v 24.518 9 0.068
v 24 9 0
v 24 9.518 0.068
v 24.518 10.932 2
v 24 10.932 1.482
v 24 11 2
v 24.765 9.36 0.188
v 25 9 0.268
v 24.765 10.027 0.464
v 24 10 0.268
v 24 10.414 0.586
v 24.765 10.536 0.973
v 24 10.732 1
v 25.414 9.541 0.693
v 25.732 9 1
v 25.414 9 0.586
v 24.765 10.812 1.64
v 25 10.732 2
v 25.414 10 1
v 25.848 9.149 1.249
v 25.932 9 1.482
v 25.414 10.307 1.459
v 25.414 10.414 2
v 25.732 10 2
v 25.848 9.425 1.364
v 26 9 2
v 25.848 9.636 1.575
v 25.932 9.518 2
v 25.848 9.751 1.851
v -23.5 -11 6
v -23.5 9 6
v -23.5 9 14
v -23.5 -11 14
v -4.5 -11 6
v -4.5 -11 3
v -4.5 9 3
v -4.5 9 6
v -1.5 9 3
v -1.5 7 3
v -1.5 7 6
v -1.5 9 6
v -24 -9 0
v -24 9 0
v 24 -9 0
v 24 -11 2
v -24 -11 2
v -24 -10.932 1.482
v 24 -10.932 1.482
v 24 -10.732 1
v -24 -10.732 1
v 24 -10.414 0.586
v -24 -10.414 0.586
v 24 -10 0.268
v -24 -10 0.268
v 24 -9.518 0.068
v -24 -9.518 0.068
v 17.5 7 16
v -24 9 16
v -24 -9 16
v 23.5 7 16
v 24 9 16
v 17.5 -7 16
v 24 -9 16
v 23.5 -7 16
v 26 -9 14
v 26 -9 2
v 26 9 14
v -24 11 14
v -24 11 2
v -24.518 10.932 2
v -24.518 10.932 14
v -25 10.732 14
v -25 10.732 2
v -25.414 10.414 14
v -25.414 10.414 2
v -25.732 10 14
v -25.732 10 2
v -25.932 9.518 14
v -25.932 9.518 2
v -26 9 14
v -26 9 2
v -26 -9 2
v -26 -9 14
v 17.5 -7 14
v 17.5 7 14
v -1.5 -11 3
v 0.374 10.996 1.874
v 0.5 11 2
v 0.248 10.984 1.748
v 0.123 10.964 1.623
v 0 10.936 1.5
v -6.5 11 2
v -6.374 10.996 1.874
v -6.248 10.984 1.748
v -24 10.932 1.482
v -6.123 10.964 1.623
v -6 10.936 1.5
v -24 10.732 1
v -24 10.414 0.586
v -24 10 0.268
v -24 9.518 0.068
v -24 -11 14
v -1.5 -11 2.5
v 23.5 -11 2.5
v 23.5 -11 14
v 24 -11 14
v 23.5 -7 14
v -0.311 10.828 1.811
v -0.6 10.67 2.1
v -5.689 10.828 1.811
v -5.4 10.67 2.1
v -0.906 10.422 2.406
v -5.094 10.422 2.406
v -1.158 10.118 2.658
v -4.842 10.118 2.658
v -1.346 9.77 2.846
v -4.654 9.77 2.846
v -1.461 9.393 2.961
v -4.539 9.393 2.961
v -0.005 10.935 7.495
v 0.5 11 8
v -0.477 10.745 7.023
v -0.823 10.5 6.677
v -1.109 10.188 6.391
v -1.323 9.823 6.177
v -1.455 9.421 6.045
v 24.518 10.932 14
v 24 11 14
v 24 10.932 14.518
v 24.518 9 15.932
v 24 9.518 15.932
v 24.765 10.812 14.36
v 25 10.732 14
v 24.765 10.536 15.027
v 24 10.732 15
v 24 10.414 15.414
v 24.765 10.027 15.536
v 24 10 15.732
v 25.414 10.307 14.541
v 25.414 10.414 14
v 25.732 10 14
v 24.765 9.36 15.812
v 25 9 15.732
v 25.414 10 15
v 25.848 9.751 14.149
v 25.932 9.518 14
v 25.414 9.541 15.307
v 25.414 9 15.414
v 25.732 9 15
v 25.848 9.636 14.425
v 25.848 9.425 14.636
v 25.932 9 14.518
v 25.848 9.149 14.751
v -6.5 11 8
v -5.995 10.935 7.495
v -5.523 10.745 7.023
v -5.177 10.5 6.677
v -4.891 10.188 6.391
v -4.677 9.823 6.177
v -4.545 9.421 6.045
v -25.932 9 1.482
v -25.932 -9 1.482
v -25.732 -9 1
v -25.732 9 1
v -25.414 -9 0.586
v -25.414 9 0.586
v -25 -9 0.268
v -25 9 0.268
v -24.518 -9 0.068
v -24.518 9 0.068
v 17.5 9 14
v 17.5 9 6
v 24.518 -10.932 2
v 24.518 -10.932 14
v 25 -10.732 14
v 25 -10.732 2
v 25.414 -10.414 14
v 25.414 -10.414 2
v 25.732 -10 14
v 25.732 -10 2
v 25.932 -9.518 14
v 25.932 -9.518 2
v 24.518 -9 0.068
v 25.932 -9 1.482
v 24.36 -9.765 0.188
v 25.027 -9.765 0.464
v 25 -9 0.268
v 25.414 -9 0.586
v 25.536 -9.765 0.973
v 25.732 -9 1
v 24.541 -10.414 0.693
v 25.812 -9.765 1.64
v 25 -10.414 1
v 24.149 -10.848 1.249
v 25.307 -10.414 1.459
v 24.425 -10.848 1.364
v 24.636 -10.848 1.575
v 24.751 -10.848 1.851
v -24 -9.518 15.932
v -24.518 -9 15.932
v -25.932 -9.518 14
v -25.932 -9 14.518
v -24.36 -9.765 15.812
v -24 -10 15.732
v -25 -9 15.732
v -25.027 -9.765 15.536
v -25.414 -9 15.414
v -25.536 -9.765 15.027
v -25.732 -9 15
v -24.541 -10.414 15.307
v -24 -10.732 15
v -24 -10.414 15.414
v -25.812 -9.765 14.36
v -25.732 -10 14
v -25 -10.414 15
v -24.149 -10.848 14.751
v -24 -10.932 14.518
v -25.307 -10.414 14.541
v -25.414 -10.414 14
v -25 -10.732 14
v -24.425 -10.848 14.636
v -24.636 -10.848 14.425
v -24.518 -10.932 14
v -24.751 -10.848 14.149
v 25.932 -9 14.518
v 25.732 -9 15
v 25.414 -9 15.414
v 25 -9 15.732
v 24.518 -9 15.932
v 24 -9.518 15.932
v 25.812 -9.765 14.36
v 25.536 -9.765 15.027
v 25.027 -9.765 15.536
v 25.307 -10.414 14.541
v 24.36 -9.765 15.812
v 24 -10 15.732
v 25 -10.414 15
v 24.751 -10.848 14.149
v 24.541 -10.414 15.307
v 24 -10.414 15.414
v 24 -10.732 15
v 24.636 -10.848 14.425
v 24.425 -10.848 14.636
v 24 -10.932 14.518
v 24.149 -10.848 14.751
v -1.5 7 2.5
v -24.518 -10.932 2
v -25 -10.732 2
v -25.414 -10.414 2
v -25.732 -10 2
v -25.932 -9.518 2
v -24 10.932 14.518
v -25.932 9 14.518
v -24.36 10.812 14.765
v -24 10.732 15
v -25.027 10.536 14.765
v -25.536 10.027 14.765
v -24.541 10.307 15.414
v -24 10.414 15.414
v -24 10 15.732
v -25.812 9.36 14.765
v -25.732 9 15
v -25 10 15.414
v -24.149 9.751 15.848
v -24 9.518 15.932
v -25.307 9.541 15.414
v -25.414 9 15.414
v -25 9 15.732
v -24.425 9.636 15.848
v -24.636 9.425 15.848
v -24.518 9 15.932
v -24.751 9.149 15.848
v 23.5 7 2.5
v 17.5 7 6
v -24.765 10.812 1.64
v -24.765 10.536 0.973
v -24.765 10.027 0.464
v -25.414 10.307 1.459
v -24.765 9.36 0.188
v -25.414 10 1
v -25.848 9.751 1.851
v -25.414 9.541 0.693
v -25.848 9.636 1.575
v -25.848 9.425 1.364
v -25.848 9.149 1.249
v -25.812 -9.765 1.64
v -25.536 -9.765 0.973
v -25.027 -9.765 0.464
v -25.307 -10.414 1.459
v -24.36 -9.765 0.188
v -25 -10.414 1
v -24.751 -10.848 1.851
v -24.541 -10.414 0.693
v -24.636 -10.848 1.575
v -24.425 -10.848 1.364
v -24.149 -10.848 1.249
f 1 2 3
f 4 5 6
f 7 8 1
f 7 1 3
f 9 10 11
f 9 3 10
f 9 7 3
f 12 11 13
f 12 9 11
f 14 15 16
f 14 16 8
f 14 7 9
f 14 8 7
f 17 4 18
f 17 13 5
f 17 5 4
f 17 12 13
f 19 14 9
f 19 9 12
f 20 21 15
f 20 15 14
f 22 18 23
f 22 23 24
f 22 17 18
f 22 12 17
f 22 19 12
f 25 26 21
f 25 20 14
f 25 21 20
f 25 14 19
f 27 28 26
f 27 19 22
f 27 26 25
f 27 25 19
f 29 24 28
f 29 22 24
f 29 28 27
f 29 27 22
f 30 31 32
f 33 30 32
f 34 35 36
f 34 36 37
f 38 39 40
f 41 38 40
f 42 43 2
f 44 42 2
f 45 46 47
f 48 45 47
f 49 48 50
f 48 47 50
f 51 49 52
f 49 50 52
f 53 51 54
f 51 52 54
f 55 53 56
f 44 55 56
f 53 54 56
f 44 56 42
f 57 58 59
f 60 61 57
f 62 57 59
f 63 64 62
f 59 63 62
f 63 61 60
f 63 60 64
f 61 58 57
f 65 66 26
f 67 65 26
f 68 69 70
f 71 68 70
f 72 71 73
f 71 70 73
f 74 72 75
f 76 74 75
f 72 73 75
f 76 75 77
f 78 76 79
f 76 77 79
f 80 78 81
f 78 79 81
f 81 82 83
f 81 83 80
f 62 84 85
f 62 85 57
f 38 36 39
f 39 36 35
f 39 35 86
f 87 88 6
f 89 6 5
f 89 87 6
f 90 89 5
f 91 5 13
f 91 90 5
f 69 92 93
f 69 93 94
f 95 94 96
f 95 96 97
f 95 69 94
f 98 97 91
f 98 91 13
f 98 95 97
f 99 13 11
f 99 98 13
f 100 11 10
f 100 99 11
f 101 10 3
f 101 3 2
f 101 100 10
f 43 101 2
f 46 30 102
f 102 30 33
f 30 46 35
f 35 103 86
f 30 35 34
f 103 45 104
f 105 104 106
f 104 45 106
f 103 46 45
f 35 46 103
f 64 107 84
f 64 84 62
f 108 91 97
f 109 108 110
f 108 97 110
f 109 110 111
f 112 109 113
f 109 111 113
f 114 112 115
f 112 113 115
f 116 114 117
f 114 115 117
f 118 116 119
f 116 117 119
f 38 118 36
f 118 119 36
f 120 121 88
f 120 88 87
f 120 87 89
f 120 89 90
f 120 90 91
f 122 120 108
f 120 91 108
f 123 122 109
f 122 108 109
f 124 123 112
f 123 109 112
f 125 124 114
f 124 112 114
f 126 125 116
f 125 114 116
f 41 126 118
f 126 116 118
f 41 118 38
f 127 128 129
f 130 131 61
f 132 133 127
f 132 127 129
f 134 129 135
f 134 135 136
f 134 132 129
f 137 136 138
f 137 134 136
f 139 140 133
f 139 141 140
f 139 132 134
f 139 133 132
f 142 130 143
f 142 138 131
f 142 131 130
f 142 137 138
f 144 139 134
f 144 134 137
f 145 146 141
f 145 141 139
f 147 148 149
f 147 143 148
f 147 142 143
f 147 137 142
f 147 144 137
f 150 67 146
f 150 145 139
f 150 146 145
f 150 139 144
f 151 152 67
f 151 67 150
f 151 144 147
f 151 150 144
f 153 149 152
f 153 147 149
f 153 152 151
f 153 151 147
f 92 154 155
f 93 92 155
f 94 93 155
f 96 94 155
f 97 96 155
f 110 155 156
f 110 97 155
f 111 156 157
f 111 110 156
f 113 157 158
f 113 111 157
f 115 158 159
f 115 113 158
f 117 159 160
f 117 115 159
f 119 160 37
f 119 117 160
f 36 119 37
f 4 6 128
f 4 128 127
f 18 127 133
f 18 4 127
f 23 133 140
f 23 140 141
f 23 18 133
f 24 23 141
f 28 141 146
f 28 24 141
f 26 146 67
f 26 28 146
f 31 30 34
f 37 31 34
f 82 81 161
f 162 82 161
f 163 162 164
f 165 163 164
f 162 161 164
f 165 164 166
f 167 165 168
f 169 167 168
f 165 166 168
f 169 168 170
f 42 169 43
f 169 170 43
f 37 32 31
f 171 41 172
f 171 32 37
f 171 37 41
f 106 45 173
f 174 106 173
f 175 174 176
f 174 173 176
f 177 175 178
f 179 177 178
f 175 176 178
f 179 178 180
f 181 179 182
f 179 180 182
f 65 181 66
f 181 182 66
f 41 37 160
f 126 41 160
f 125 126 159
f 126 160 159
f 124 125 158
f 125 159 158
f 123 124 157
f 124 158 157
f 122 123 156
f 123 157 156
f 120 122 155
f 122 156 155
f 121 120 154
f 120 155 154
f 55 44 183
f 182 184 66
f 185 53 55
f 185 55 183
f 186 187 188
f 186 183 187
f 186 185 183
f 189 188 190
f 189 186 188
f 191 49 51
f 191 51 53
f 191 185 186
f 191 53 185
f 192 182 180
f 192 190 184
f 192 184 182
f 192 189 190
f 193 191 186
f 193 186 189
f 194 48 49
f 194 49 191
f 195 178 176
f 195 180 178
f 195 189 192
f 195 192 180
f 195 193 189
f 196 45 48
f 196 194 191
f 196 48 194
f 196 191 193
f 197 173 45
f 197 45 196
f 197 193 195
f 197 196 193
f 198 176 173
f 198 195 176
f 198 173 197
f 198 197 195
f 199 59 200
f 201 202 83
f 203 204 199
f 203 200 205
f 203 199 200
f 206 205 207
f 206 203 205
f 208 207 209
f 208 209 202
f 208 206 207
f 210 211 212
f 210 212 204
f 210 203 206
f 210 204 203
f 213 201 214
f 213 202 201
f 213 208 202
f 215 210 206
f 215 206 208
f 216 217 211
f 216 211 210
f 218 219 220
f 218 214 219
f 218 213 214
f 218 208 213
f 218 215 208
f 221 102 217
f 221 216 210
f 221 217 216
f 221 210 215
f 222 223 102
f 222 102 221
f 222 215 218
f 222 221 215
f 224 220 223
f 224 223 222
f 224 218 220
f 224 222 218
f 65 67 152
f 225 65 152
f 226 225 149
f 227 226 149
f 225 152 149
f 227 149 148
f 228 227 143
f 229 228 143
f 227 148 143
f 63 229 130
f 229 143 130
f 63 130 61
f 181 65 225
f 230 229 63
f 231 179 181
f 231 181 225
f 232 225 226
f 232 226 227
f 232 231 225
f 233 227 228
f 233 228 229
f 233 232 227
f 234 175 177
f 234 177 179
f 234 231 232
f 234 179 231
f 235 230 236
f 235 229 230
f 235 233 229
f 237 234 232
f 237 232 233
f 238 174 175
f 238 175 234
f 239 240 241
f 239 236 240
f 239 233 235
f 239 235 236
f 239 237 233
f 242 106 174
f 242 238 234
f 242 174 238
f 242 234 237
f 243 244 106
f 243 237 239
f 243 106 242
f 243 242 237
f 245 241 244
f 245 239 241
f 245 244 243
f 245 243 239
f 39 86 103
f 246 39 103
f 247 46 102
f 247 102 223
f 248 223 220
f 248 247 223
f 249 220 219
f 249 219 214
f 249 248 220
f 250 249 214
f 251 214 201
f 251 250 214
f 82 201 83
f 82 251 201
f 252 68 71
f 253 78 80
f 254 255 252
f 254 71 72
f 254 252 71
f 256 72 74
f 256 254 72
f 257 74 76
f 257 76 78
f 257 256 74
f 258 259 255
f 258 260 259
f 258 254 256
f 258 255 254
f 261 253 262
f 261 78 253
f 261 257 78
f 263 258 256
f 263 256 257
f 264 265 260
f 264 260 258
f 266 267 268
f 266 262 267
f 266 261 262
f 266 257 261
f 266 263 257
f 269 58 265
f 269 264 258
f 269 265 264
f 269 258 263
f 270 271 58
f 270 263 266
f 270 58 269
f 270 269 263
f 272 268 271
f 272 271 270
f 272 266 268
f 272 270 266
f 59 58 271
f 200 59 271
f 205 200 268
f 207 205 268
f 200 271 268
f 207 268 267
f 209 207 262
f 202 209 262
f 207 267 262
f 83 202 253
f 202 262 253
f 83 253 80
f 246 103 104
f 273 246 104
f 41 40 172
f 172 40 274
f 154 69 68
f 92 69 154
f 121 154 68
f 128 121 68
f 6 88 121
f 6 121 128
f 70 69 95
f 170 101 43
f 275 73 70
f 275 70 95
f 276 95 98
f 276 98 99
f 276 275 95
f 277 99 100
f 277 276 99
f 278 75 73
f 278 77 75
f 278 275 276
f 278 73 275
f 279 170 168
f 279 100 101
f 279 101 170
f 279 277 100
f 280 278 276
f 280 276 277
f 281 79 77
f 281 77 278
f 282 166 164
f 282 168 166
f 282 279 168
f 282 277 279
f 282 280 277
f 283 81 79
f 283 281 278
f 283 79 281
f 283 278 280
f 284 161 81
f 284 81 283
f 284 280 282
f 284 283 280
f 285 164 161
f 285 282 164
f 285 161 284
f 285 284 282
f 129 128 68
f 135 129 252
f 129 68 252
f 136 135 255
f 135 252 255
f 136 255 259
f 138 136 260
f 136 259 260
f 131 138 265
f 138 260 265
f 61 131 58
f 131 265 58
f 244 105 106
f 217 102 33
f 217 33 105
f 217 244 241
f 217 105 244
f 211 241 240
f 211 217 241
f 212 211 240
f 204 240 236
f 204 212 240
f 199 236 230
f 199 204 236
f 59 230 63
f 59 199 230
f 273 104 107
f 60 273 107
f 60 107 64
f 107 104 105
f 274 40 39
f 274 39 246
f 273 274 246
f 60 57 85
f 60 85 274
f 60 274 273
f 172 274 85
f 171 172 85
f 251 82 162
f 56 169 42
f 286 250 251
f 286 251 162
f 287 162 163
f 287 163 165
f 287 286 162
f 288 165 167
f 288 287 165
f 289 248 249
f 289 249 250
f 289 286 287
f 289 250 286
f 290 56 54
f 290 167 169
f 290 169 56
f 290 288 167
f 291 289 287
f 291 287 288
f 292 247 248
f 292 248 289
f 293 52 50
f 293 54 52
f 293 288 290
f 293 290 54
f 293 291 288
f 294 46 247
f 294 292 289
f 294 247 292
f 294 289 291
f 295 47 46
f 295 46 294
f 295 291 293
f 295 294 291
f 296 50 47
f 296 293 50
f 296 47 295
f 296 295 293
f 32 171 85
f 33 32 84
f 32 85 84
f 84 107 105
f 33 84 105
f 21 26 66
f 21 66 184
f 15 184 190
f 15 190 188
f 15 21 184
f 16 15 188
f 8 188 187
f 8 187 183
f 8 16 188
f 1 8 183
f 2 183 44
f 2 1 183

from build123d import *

# Parameters (mm, degrees)
F0_W           = 52
F0_H           = 22
F1_DEPTH       = 16
F2_W           = 41
F2_H           = 8
F3_DEPTH       = 20
F4_W           = 6
F4_H           = 10
F5_DEPTH       = 18
F6_W           = 3
F6_H           = 3
F7_DEPTH       = 22
F8_W           = 4
F8_H           = 2
F9_DEPTH       = 6
F10_T1_DEPTH   = 18
F10_T3_DEPTH   = 12
F10_T5_DEPTH   = 48
F10_T7_DEPTH   = 3
F10_T9_DEPTH   = 3
F10_S13_W      = 2
F10_S13_H      = 2
F10_T14_DEPTH  = 2
F10_S19_W      = 2
F10_S19_H      = 2
F10_T20_DEPTH  = 2
F10_S25_W      = 2
F10_S25_H      = 2
F10_T26_DEPTH  = 2
F10_S31_W      = 2
F10_S31_H      = 2
F10_T32_DEPTH  = 2
F10_S37_W      = 2
F10_S37_H      = 2
F10_T38_DEPTH  = 2
F10_S43_W      = 2
F10_S43_H      = 2
F10_T44_DEPTH  = 2
F10_S49_W      = 2
F10_S49_H      = 2
F10_T50_DEPTH  = 2
F10_S55_W      = 2
F10_S55_H      = 2
F10_T56_DEPTH  = 2
F10_T63_DEPTH  = 8
F10_T67_DEPTH  = 8
F10_T74_DEPTH  = 8
F10_T78_DEPTH  = 8
F10_T85_DEPTH  = 8
F10_T89_DEPTH  = 8
F10_T96_DEPTH  = 8
F10_T100_DEPTH = 8


# Not quite as in the source:
# - a fillet or chamfer that OpenCascade refuses, or shapes differently, is made with other operations: its cross-section is extruded or revolved along the edge and cut away or added


with BuildPart() as f1:
    # F0 (on Top) → F1 (new body)
    with BuildSketch(Plane.XY):
        Rectangle(F0_W, F0_H)
    extrude(amount=F1_DEPTH)

    # F2 (on face) → F3 (cut)
    with BuildSketch(Plane.XZ.offset(11)):
        with Locations((-3, 10)):
            Rectangle(F2_W, F2_H)
    extrude(amount=-F3_DEPTH, mode=Mode.SUBTRACT)

    # F4 (on face) → F5 (cut)
    with BuildSketch(Plane.XZ.offset(11)):
        Polygon((17.5, 6), (-1.5, 6), (-1.5, 2.5), (23.5, 2.5), (23.5, 6), align=None)
        with Locations((20.5, 11)):
            Rectangle(F4_W, F4_H)
    extrude(amount=-F5_DEPTH, mode=Mode.SUBTRACT)

    # F6 (on face) → F7 (cut, through all)
    with BuildSketch(Plane.XZ.offset(11)):
        with Locations((-3, 4.5)):
            Rectangle(F6_W, F6_H)
    extrude(amount=-F7_DEPTH, mode=Mode.SUBTRACT)

    # F8 (on face) → F9 (join)
    with BuildSketch(Plane(origin=(23.5, 0, 0), x_dir=(0, -1, 0), z_dir=(-1, 0, 0))):
        with Locations((9, 15)):
            Rectangle(F8_W, F8_H)
    extrude(amount=F9_DEPTH)

    # F10: fillet of radius 2 on 16 edges, made by hand

    # F10_s2 → F10_t1 (cut)
    with BuildSketch(Plane.XZ.offset(-9)):
        with BuildLine():
            ThreePointArc((-26, 2), (-25.4142135624, 0.5857864376), (-24, 0))
            Line((-24, 0), (-26, 0))
            Line((-26, 0), (-26, 2))
        make_face()
        with BuildLine():
            ThreePointArc((-24, 16), (-25.4142135624, 15.4142135624), (-26, 14))
            Line((-26, 14), (-26, 16))
            Line((-26, 16), (-24, 16))
        make_face()
        with BuildLine():
            ThreePointArc((26, 14), (25.4142135624, 15.4142135624), (24, 16))
            Line((24, 16), (26, 16))
            Line((26, 16), (26, 14))
        make_face()
        with BuildLine():
            ThreePointArc((26, 2), (25.4142135624, 0.5857864376), (24, 0))
            Line((24, 0), (26, 0))
            Line((26, 0), (26, 2))
        make_face()
    extrude(amount=F10_T1_DEPTH, mode=Mode.SUBTRACT)

    # F10_s4 → F10_t3 (cut)
    with BuildSketch(Plane.XY.offset(2)):
        with BuildLine():
            ThreePointArc((-24, -11), (-25.4142135624, -10.4142135624), (-26, -9))
            Line((-26, -9), (-26, -11))
            Line((-26, -11), (-24, -11))
        make_face()
        with BuildLine():
            ThreePointArc((24, -11), (25.4142135624, -10.4142135624), (26, -9))
            Line((26, -9), (26, -11))
            Line((26, -11), (24, -11))
        make_face()
        with BuildLine():
            ThreePointArc((24, 11), (25.4142135624, 10.4142135624), (26, 9))
            Line((26, 9), (26, 11))
            Line((26, 11), (24, 11))
        make_face()
        with BuildLine():
            ThreePointArc((-24, 11), (-25.4142135624, 10.4142135624), (-26, 9))
            Line((-26, 9), (-26, 11))
            Line((-26, 11), (-24, 11))
        make_face()
    extrude(amount=F10_T3_DEPTH, mode=Mode.SUBTRACT)

    # F10_s6 → F10_t5 (cut)
    with BuildSketch(Plane.YZ.offset(-24)):
        with BuildLine():
            ThreePointArc((-11, 14), (-10.4142135624, 15.4142135624), (-9, 16))
            Line((-9, 16), (-11, 16))
            Line((-11, 16), (-11, 14))
        make_face()
        with BuildLine():
            ThreePointArc((-11, 2), (-10.4142135624, 0.5857864376), (-9, 0))
            Line((-9, 0), (-11, 0))
            Line((-11, 0), (-11, 2))
        make_face()
        with BuildLine():
            ThreePointArc((11, 14), (10.4142135624, 15.4142135624), (9, 16))
            Line((9, 16), (11, 16))
            Line((11, 16), (11, 14))
        make_face()
        with BuildLine():
            ThreePointArc((11, 2), (10.4142135624, 0.5857864376), (9, 0))
            Line((9, 0), (11, 0))
            Line((11, 0), (11, 2))
        make_face()
    extrude(amount=F10_T5_DEPTH, mode=Mode.SUBTRACT)

    # F10_s8 → F10_t7 (cut)
    with BuildSketch(Plane.YZ.offset(-4.5)):
        with BuildLine():
            ThreePointArc((9, 6), (10.4142135624, 6.5857864376), (11, 8))
            Line((11, 8), (11, 6))
            Line((11, 6), (9, 6))
        make_face()
        with BuildLine():
            ThreePointArc((11, 1), (10.4142135624, 2.4142135624), (9, 3))
            Line((9, 3), (11, 3))
            Line((11, 3), (11, 1))
        make_face()
    extrude(amount=F10_T7_DEPTH, mode=Mode.SUBTRACT)

    # F10_s10 → F10_t9 (cut)
    with BuildSketch(Plane.XY.offset(3)):
        with BuildLine():
            ThreePointArc((-6.5, 11), (-5.0857864376, 10.4142135624), (-4.5, 9))
            Line((-4.5, 9), (-4.5, 11))
            Line((-4.5, 11), (-6.5, 11))
        make_face()
        with BuildLine():
            ThreePointArc((0.5, 11), (-0.9142135624, 10.4142135624), (-1.5, 9))
            Line((-1.5, 9), (-1.5, 11))
            Line((-1.5, 11), (0.5, 11))
        make_face()
    extrude(amount=F10_T9_DEPTH, mode=Mode.SUBTRACT)


with BuildPart() as f10_tool12:
    # F10_s13 → F10_t14 (new body)
    with BuildSketch(Plane.YZ.offset(-24)):
        with Locations((10, 1)):
            Rectangle(F10_S13_W, F10_S13_H)
    extrude(amount=-F10_T14_DEPTH)

    # F10_s15 → F10_t16 (revolve, cut)
    with BuildSketch(Plane(origin=(-24, 9, 2), x_dir=(0, -0.7071067812, 0.7071067812), z_dir=(0, -0.7071067812, -0.7071067812))):
        with BuildLine():
            ThreePointArc((0, -2), (2, 0), (0, 2))
            Line((0, 2), (0, -2))
        make_face()
    revolve(axis=Axis((-24, 9, 2), (-1, 0, 0)), mode=Mode.SUBTRACT)


with BuildPart() as f1_1:
    add(f1.part)

    # F10_t11: cut F10_tool12
    add(f10_tool12.part, mode=Mode.SUBTRACT)


with BuildPart() as f10_tool18:
    # F10_s19 → F10_t20 (new body)
    with BuildSketch(Plane.XZ.offset(9)):
        with Locations((-25, 1)):
            Rectangle(F10_S19_W, F10_S19_H)
    extrude(amount=F10_T20_DEPTH)

    # F10_s21 → F10_t22 (revolve, cut)
    with BuildSketch(Plane(origin=(-24, -9, 2), x_dir=(0.7071067812, 0, 0.7071067812), z_dir=(0.7071067812, 0, -0.7071067812))):
        with BuildLine():
            ThreePointArc((0, -2), (2, 0), (0, 2))
            Line((0, 2), (0, -2))
        make_face()
    revolve(axis=Axis((-24, -9, 2), (0, -1, 0)), mode=Mode.SUBTRACT)


with BuildPart() as f1_2:
    add(f1_1.part)

    # F10_t17: cut F10_tool18
    add(f10_tool18.part, mode=Mode.SUBTRACT)


with BuildPart() as f10_tool24:
    # F10_s25 → F10_t26 (new body)
    with BuildSketch(Plane.XZ.offset(9)):
        with Locations((-25, 15)):
            Rectangle(F10_S25_W, F10_S25_H)
    extrude(amount=F10_T26_DEPTH)

    # F10_s27 → F10_t28 (revolve, cut)
    with BuildSketch(Plane(origin=(-24, -9, 14), x_dir=(0.7071067812, 0, -0.7071067812), z_dir=(-0.7071067812, 0, -0.7071067812))):
        with BuildLine():
            ThreePointArc((0, -2), (2, 0), (0, 2))
            Line((0, 2), (0, -2))
        make_face()
    revolve(axis=Axis((-24, -9, 14), (0, -1, 0)), mode=Mode.SUBTRACT)


with BuildPart() as f1_3:
    add(f1_2.part)

    # F10_t23: cut F10_tool24
    add(f10_tool24.part, mode=Mode.SUBTRACT)


with BuildPart() as f10_tool30:
    # F10_s31 → F10_t32 (new body)
    with BuildSketch(Plane.XZ.offset(9)):
        with Locations((25, 15)):
            Rectangle(F10_S31_W, F10_S31_H)
    extrude(amount=F10_T32_DEPTH)

    # F10_s33 → F10_t34 (revolve, cut)
    with BuildSketch(Plane(origin=(24, -9, 14), x_dir=(-0.7071067812, 0, -0.7071067812), z_dir=(-0.7071067812, 0, 0.7071067812))):
        with BuildLine():
            ThreePointArc((0, -2), (2, 0), (0, 2))
            Line((0, 2), (0, -2))
        make_face()
    revolve(axis=Axis((24, -9, 14), (0, -1, 0)), mode=Mode.SUBTRACT)


with BuildPart() as f1_4:
    add(f1_3.part)

    # F10_t29: cut F10_tool30
    add(f10_tool30.part, mode=Mode.SUBTRACT)


with BuildPart() as f10_tool36:
    # F10_s37 → F10_t38 (new body)
    with BuildSketch(Plane.XY.offset(14)):
        with Locations((-25, 10)):
            Rectangle(F10_S37_W, F10_S37_H)
    extrude(amount=F10_T38_DEPTH)

    # F10_s39 → F10_t40 (revolve, cut)
    with BuildSketch(Plane(origin=(-24, 9, 14), x_dir=(0.7071067812, -0.7071067812, 0), z_dir=(-0.7071067812, -0.7071067812, 0))):
        with BuildLine():
            ThreePointArc((0, -2), (2, 0), (0, 2))
            Line((0, 2), (0, -2))
        make_face()
    revolve(axis=Axis((-24, 9, 14), (0, 0, 1)), mode=Mode.SUBTRACT)


with BuildPart() as f1_5:
    add(f1_4.part)

    # F10_t35: cut F10_tool36
    add(f10_tool36.part, mode=Mode.SUBTRACT)


with BuildPart() as f10_tool42:
    # F10_s43 → F10_t44 (new body)
    with BuildSketch(Plane.XZ.offset(9)):
        with Locations((25, 1)):
            Rectangle(F10_S43_W, F10_S43_H)
    extrude(amount=F10_T44_DEPTH)

    # F10_s45 → F10_t46 (revolve, cut)
    with BuildSketch(Plane(origin=(24, -9, 2), x_dir=(-0.7071067812, 0, 0.7071067812), z_dir=(0.7071067812, 0, 0.7071067812))):
        with BuildLine():
            ThreePointArc((0, -2), (2, 0), (0, 2))
            Line((0, 2), (0, -2))
        make_face()
    revolve(axis=Axis((24, -9, 2), (0, -1, 0)), mode=Mode.SUBTRACT)


with BuildPart() as f1_6:
    add(f1_5.part)

    # F10_t41: cut F10_tool42
    add(f10_tool42.part, mode=Mode.SUBTRACT)


with BuildPart() as f10_tool48:
    # F10_s49 → F10_t50 (new body)
    with BuildSketch(Plane.YZ.offset(24)):
        with Locations((10, 15)):
            Rectangle(F10_S49_W, F10_S49_H)
    extrude(amount=F10_T50_DEPTH)

    # F10_s51 → F10_t52 (revolve, cut)
    with BuildSketch(Plane(origin=(24, 9, 14), x_dir=(0, -0.7071067812, -0.7071067812), z_dir=(0, -0.7071067812, 0.7071067812))):
        with BuildLine():
            ThreePointArc((0, -2), (2, 0), (0, 2))
            Line((0, 2), (0, -2))
        make_face()
    revolve(axis=Axis((24, 9, 14), (1, 0, 0)), mode=Mode.SUBTRACT)


with BuildPart() as f1_7:
    add(f1_6.part)

    # F10_t47: cut F10_tool48
    add(f10_tool48.part, mode=Mode.SUBTRACT)


with BuildPart() as f10_tool54:
    # F10_s55 → F10_t56 (new body)
    with BuildSketch(Plane.YZ.offset(24)):
        with Locations((10, 1)):
            Rectangle(F10_S55_W, F10_S55_H)
    extrude(amount=F10_T56_DEPTH)

    # F10_s57 → F10_t58 (revolve, cut)
    with BuildSketch(Plane(origin=(24, 9, 2), x_dir=(0, -0.7071067812, 0.7071067812), z_dir=(0, 0.7071067812, 0.7071067812))):
        with BuildLine():
            ThreePointArc((0, -2), (2, 0), (0, 2))
            Line((0, 2), (0, -2))
        make_face()
    revolve(axis=Axis((24, 9, 2), (1, 0, 0)), mode=Mode.SUBTRACT)


with BuildPart() as f1_8:
    add(f1_7.part)

    # F10_t53: cut F10_tool54
    add(f10_tool54.part, mode=Mode.SUBTRACT)


with BuildPart() as f10_tool61:
    # F10_s62 → F10_t63 (new body)
    with BuildSketch(Plane.YZ.offset(3.5)):
        with BuildLine():
            ThreePointArc((9, 6), (10.4142135624, 6.5857864376), (11, 8))
            Line((11, 8), (11, 6))
            Line((11, 6), (9, 6))
        make_face()
    extrude(amount=-F10_T63_DEPTH)

    split(bisect_by=Plane.YZ.offset(-1.5), keep=Keep.TOP)


with BuildPart() as f10_tool65:
    # F10_s66 → F10_t67 (new body)
    with BuildSketch(Plane.XY.offset(3)):
        with BuildLine():
            ThreePointArc((0.5, 11), (-0.9142135624, 10.4142135624), (-1.5, 9))
            Line((-1.5, 9), (-1.5, 11))
            Line((-1.5, 11), (0.5, 11))
        make_face()
    extrude(amount=F10_T67_DEPTH)

    split(bisect_by=Plane.XY.offset(6), keep=Keep.TOP)


with BuildPart() as f10_tool61_1:
    add(f10_tool61.part)

    # F10_t69: intersect F10_tool65
    add(f10_tool65.part, mode=Mode.INTERSECT)


with BuildPart() as f1_9:
    add(f1_8.part)

    # F10_t59: cut F10_tool61
    add(f10_tool61_1.part, mode=Mode.SUBTRACT)


with BuildPart() as f10_tool72:
    # F10_s73 → F10_t74 (new body)
    with BuildSketch(Plane.YZ.offset(-1.5)):
        with BuildLine():
            ThreePointArc((9, 6), (10.4142135624, 6.5857864376), (11, 8))
            Line((11, 8), (11, 6))
            Line((11, 6), (9, 6))
        make_face()
    extrude(amount=-F10_T74_DEPTH)

    split(bisect_by=Plane.YZ.offset(-4.5), keep=Keep.BOTTOM)


with BuildPart() as f10_tool76:
    # F10_s77 → F10_t78 (new body)
    with BuildSketch(Plane.XY.offset(11)):
        with BuildLine():
            ThreePointArc((-6.5, 11), (-5.0857864376, 10.4142135624), (-4.5, 9))
            Line((-4.5, 9), (-4.5, 11))
            Line((-4.5, 11), (-6.5, 11))
        make_face()
    extrude(amount=-F10_T78_DEPTH)

    split(bisect_by=Plane.XY.offset(6), keep=Keep.TOP)


with BuildPart() as f10_tool72_1:
    add(f10_tool72.part)

    # F10_t80: intersect F10_tool76
    add(f10_tool76.part, mode=Mode.INTERSECT)


with BuildPart() as f1_10:
    add(f1_9.part)

    # F10_t70: cut F10_tool72
    add(f10_tool72_1.part, mode=Mode.SUBTRACT)


with BuildPart() as f10_tool83:
    # F10_s84 → F10_t85 (new body)
    with BuildSketch(Plane.XY.offset(6)):
        with BuildLine():
            ThreePointArc((-6.5, 11), (-5.0857864376, 10.4142135624), (-4.5, 9))
            Line((-4.5, 9), (-4.5, 11))
            Line((-4.5, 11), (-6.5, 11))
        make_face()
    extrude(amount=-F10_T85_DEPTH)

    split(bisect_by=Plane.XY.offset(3), keep=Keep.BOTTOM)


with BuildPart() as f10_tool87:
    # F10_s88 → F10_t89 (new body)
    with BuildSketch(Plane.YZ.offset(-9.5)):
        with BuildLine():
            ThreePointArc((11, 1), (10.4142135624, 2.4142135624), (9, 3))
            Line((9, 3), (11, 3))
            Line((11, 3), (11, 1))
        make_face()
    extrude(amount=F10_T89_DEPTH)

    split(bisect_by=Plane.YZ.offset(-4.5), keep=Keep.BOTTOM)


with BuildPart() as f10_tool83_1:
    add(f10_tool83.part)

    # F10_t91: intersect F10_tool87
    add(f10_tool87.part, mode=Mode.INTERSECT)


with BuildPart() as f1_11:
    add(f1_10.part)

    # F10_t81: cut F10_tool83
    add(f10_tool83_1.part, mode=Mode.SUBTRACT)


with BuildPart() as f10_tool94:
    # F10_s95 → F10_t96 (new body)
    with BuildSketch(Plane.XY.offset(-2)):
        with BuildLine():
            ThreePointArc((0.5, 11), (-0.9142135624, 10.4142135624), (-1.5, 9))
            Line((-1.5, 9), (-1.5, 11))
            Line((-1.5, 11), (0.5, 11))
        make_face()
    extrude(amount=F10_T96_DEPTH)

    split(bisect_by=Plane.XY.offset(3), keep=Keep.BOTTOM)


with BuildPart() as f10_tool98:
    # F10_s99 → F10_t100 (new body)
    with BuildSketch(Plane.YZ.offset(-4.5)):
        with BuildLine():
            ThreePointArc((11, 1), (10.4142135624, 2.4142135624), (9, 3))
            Line((9, 3), (11, 3))
            Line((11, 3), (11, 1))
        make_face()
    extrude(amount=F10_T100_DEPTH)

    split(bisect_by=Plane.YZ.offset(-1.5), keep=Keep.TOP)


with BuildPart() as f10_tool94_1:
    add(f10_tool94.part)

    # F10_t102: intersect F10_tool98
    add(f10_tool98.part, mode=Mode.INTERSECT)


with BuildPart() as f1_12:
    add(f1_11.part)

    # F10_t92: cut F10_tool94
    add(f10_tool94_1.part, mode=Mode.SUBTRACT)


solid = f1_12.part
